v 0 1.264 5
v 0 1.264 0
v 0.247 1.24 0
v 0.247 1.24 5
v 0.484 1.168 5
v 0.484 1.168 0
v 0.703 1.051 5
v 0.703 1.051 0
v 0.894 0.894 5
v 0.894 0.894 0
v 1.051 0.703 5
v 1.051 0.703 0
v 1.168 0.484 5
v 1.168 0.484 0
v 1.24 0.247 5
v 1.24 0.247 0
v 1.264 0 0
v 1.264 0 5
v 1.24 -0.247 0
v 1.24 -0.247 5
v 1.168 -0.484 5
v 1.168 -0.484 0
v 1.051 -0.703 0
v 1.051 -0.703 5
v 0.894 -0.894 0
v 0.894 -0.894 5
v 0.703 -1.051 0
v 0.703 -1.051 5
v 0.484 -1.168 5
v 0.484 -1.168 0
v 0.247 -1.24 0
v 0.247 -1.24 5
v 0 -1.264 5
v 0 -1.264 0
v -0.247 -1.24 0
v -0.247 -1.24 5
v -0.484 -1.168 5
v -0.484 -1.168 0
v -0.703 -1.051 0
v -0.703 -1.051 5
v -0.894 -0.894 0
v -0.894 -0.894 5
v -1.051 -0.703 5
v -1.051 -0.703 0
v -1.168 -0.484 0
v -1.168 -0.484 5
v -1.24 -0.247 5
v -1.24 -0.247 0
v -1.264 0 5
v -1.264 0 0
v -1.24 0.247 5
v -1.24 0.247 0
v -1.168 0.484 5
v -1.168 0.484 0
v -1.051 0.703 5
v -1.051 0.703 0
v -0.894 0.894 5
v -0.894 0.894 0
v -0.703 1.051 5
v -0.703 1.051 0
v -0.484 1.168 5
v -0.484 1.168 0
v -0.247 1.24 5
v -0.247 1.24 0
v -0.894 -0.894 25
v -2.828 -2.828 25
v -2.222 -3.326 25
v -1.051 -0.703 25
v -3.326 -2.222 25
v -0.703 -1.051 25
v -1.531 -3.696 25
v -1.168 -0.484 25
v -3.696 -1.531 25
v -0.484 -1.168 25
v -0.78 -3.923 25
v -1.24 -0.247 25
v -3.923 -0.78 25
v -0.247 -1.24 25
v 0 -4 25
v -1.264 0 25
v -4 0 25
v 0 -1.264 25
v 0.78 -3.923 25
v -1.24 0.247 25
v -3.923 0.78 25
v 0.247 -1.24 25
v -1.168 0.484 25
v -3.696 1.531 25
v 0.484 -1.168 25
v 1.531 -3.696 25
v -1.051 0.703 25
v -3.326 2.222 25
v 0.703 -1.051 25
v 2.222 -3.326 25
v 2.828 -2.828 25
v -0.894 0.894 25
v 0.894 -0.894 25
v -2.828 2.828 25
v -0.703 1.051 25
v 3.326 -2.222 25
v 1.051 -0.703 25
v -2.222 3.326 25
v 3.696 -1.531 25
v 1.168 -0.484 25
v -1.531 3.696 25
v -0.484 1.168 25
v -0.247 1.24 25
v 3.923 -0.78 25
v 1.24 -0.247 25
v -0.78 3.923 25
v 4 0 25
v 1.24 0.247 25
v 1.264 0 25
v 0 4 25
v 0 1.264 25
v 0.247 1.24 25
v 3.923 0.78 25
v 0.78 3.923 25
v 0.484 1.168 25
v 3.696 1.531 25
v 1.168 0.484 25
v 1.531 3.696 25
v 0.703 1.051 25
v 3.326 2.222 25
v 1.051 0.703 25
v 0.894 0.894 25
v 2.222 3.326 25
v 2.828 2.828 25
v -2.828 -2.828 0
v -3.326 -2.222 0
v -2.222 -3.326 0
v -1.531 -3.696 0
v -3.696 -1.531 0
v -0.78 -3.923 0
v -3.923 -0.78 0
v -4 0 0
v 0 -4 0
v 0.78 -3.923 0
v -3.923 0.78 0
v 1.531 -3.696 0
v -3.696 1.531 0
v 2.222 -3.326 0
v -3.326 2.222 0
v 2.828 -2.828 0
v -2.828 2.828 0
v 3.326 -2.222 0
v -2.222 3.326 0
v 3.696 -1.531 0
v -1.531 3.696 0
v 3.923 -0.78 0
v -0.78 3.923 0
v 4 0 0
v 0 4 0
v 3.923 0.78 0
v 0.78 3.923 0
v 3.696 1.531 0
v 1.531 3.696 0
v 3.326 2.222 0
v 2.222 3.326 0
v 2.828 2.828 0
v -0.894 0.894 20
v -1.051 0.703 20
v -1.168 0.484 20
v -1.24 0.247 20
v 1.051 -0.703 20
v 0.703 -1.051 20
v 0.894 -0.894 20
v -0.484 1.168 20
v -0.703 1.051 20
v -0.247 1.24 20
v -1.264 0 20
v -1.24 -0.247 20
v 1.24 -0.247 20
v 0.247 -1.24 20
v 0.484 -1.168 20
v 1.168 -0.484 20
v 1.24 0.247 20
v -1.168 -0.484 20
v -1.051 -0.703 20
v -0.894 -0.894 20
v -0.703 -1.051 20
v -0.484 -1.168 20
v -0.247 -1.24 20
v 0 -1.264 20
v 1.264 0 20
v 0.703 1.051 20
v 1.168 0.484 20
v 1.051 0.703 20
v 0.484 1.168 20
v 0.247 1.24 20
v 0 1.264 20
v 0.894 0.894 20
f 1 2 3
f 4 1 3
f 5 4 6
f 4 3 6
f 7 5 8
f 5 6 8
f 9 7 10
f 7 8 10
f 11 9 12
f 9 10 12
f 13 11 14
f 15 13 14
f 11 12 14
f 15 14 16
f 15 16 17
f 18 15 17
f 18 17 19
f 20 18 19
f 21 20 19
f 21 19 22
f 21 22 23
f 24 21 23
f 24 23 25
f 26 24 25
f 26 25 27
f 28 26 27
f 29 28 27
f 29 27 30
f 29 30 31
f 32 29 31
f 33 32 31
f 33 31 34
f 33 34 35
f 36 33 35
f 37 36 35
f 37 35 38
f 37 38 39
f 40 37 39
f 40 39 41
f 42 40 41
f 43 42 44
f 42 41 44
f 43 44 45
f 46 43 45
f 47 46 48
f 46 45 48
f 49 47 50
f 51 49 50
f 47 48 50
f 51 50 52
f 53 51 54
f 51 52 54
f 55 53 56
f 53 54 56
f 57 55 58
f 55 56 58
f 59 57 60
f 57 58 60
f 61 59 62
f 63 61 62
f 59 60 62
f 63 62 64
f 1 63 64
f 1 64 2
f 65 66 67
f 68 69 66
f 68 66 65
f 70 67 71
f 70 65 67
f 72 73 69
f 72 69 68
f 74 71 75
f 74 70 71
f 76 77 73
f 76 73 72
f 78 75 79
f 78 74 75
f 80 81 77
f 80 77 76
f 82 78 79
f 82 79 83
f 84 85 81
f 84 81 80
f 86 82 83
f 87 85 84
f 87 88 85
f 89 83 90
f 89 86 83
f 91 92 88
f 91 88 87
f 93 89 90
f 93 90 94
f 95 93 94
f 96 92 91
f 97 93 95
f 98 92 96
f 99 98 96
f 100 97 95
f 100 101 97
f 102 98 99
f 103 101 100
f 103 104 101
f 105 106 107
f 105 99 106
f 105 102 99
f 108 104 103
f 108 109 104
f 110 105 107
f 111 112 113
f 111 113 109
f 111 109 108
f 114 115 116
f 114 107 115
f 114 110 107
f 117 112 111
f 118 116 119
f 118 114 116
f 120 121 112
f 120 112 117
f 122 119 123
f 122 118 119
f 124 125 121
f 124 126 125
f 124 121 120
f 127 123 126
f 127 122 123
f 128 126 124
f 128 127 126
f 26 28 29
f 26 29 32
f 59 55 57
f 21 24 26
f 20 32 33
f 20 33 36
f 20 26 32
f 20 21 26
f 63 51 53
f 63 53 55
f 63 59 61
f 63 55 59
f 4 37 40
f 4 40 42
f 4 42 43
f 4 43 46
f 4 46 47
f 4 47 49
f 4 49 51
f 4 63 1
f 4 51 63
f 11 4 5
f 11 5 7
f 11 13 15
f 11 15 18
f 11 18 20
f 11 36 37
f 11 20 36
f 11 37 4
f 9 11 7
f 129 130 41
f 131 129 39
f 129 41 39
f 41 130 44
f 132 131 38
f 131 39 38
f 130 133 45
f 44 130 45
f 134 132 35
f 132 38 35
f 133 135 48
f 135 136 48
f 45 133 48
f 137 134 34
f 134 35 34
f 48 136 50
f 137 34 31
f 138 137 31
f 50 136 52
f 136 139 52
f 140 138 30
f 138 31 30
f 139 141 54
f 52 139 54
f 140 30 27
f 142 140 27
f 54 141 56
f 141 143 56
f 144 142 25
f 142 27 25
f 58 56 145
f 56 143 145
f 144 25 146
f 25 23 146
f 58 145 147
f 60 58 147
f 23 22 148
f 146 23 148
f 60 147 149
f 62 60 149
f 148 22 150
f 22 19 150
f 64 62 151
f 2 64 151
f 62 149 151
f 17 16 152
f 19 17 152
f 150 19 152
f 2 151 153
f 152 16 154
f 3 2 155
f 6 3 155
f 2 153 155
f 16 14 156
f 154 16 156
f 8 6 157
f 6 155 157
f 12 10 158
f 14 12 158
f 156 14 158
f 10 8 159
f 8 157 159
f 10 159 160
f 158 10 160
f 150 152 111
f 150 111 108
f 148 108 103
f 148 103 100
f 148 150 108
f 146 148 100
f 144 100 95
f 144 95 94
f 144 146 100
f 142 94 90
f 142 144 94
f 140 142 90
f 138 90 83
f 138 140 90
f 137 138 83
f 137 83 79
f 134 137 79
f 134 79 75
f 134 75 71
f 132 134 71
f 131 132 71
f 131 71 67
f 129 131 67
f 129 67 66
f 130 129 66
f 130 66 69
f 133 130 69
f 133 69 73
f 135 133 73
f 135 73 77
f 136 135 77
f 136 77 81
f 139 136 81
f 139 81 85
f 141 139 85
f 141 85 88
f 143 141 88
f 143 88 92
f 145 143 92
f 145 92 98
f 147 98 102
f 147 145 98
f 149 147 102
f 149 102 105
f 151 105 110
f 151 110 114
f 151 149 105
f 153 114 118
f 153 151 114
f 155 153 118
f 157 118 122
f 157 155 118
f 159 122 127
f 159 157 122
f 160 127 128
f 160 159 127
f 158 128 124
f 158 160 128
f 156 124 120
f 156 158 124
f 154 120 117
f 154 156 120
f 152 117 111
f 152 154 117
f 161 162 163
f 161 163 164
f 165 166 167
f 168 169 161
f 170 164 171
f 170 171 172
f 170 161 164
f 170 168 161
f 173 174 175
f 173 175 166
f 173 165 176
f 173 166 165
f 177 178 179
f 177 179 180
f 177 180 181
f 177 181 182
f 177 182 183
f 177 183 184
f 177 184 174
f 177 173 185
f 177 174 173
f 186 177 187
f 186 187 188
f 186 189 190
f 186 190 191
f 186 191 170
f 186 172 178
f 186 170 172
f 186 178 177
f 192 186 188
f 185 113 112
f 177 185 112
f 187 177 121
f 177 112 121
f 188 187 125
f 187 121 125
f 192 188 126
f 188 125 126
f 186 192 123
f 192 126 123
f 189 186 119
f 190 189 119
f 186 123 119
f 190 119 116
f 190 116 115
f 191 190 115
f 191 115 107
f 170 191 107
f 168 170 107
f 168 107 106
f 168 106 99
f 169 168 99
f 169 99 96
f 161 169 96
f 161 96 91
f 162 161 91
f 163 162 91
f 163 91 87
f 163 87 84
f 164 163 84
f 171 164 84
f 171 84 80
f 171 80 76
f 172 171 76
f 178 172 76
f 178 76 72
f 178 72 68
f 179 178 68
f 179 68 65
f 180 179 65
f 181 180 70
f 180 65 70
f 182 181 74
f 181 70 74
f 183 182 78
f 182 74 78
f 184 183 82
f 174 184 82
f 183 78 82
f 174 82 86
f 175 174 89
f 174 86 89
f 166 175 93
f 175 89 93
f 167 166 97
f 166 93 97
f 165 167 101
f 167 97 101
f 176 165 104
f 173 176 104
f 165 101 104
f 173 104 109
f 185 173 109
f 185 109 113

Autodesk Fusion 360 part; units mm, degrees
sketch "スケッチ1" plane through (0, 0, 0) normal (0, 0, 1) x (1, 0, 0)
  circle A0 centre (0, 0) radius 4
  dimension "d1" = 8
extrude "押し出し1" add sketch "スケッチ1" along normal blind 25
cylinder "円柱プリミティブ2" cut diameter 3 height -5 placed x (1, 0, 0) y (0, 1, 0) z (0, 0, 1) at (0, 0, 25)
thread "ねじ2" "ISO Metric profile 3.0 M3x0.5 6H" major diameter 3.086 minor diameter 2.529 pitch 0.5 angle 60 resizes the face on face at (1.4925, -0.1494, 23.3333)
cylinder "円柱プリミティブ3" cut diameter 3 height -5 placed x (0, 1, 0) y (1, 0, 0) z (0, 0, -1) at (0, 0, 0)
thread "ねじ3" "ISO Metric profile 3.0 M3x0.5 6H" major diameter 3.086 minor diameter 2.529 pitch 0.5 angle 60 resizes the face on face at (-0.1494, 1.4925, 1.6667)
